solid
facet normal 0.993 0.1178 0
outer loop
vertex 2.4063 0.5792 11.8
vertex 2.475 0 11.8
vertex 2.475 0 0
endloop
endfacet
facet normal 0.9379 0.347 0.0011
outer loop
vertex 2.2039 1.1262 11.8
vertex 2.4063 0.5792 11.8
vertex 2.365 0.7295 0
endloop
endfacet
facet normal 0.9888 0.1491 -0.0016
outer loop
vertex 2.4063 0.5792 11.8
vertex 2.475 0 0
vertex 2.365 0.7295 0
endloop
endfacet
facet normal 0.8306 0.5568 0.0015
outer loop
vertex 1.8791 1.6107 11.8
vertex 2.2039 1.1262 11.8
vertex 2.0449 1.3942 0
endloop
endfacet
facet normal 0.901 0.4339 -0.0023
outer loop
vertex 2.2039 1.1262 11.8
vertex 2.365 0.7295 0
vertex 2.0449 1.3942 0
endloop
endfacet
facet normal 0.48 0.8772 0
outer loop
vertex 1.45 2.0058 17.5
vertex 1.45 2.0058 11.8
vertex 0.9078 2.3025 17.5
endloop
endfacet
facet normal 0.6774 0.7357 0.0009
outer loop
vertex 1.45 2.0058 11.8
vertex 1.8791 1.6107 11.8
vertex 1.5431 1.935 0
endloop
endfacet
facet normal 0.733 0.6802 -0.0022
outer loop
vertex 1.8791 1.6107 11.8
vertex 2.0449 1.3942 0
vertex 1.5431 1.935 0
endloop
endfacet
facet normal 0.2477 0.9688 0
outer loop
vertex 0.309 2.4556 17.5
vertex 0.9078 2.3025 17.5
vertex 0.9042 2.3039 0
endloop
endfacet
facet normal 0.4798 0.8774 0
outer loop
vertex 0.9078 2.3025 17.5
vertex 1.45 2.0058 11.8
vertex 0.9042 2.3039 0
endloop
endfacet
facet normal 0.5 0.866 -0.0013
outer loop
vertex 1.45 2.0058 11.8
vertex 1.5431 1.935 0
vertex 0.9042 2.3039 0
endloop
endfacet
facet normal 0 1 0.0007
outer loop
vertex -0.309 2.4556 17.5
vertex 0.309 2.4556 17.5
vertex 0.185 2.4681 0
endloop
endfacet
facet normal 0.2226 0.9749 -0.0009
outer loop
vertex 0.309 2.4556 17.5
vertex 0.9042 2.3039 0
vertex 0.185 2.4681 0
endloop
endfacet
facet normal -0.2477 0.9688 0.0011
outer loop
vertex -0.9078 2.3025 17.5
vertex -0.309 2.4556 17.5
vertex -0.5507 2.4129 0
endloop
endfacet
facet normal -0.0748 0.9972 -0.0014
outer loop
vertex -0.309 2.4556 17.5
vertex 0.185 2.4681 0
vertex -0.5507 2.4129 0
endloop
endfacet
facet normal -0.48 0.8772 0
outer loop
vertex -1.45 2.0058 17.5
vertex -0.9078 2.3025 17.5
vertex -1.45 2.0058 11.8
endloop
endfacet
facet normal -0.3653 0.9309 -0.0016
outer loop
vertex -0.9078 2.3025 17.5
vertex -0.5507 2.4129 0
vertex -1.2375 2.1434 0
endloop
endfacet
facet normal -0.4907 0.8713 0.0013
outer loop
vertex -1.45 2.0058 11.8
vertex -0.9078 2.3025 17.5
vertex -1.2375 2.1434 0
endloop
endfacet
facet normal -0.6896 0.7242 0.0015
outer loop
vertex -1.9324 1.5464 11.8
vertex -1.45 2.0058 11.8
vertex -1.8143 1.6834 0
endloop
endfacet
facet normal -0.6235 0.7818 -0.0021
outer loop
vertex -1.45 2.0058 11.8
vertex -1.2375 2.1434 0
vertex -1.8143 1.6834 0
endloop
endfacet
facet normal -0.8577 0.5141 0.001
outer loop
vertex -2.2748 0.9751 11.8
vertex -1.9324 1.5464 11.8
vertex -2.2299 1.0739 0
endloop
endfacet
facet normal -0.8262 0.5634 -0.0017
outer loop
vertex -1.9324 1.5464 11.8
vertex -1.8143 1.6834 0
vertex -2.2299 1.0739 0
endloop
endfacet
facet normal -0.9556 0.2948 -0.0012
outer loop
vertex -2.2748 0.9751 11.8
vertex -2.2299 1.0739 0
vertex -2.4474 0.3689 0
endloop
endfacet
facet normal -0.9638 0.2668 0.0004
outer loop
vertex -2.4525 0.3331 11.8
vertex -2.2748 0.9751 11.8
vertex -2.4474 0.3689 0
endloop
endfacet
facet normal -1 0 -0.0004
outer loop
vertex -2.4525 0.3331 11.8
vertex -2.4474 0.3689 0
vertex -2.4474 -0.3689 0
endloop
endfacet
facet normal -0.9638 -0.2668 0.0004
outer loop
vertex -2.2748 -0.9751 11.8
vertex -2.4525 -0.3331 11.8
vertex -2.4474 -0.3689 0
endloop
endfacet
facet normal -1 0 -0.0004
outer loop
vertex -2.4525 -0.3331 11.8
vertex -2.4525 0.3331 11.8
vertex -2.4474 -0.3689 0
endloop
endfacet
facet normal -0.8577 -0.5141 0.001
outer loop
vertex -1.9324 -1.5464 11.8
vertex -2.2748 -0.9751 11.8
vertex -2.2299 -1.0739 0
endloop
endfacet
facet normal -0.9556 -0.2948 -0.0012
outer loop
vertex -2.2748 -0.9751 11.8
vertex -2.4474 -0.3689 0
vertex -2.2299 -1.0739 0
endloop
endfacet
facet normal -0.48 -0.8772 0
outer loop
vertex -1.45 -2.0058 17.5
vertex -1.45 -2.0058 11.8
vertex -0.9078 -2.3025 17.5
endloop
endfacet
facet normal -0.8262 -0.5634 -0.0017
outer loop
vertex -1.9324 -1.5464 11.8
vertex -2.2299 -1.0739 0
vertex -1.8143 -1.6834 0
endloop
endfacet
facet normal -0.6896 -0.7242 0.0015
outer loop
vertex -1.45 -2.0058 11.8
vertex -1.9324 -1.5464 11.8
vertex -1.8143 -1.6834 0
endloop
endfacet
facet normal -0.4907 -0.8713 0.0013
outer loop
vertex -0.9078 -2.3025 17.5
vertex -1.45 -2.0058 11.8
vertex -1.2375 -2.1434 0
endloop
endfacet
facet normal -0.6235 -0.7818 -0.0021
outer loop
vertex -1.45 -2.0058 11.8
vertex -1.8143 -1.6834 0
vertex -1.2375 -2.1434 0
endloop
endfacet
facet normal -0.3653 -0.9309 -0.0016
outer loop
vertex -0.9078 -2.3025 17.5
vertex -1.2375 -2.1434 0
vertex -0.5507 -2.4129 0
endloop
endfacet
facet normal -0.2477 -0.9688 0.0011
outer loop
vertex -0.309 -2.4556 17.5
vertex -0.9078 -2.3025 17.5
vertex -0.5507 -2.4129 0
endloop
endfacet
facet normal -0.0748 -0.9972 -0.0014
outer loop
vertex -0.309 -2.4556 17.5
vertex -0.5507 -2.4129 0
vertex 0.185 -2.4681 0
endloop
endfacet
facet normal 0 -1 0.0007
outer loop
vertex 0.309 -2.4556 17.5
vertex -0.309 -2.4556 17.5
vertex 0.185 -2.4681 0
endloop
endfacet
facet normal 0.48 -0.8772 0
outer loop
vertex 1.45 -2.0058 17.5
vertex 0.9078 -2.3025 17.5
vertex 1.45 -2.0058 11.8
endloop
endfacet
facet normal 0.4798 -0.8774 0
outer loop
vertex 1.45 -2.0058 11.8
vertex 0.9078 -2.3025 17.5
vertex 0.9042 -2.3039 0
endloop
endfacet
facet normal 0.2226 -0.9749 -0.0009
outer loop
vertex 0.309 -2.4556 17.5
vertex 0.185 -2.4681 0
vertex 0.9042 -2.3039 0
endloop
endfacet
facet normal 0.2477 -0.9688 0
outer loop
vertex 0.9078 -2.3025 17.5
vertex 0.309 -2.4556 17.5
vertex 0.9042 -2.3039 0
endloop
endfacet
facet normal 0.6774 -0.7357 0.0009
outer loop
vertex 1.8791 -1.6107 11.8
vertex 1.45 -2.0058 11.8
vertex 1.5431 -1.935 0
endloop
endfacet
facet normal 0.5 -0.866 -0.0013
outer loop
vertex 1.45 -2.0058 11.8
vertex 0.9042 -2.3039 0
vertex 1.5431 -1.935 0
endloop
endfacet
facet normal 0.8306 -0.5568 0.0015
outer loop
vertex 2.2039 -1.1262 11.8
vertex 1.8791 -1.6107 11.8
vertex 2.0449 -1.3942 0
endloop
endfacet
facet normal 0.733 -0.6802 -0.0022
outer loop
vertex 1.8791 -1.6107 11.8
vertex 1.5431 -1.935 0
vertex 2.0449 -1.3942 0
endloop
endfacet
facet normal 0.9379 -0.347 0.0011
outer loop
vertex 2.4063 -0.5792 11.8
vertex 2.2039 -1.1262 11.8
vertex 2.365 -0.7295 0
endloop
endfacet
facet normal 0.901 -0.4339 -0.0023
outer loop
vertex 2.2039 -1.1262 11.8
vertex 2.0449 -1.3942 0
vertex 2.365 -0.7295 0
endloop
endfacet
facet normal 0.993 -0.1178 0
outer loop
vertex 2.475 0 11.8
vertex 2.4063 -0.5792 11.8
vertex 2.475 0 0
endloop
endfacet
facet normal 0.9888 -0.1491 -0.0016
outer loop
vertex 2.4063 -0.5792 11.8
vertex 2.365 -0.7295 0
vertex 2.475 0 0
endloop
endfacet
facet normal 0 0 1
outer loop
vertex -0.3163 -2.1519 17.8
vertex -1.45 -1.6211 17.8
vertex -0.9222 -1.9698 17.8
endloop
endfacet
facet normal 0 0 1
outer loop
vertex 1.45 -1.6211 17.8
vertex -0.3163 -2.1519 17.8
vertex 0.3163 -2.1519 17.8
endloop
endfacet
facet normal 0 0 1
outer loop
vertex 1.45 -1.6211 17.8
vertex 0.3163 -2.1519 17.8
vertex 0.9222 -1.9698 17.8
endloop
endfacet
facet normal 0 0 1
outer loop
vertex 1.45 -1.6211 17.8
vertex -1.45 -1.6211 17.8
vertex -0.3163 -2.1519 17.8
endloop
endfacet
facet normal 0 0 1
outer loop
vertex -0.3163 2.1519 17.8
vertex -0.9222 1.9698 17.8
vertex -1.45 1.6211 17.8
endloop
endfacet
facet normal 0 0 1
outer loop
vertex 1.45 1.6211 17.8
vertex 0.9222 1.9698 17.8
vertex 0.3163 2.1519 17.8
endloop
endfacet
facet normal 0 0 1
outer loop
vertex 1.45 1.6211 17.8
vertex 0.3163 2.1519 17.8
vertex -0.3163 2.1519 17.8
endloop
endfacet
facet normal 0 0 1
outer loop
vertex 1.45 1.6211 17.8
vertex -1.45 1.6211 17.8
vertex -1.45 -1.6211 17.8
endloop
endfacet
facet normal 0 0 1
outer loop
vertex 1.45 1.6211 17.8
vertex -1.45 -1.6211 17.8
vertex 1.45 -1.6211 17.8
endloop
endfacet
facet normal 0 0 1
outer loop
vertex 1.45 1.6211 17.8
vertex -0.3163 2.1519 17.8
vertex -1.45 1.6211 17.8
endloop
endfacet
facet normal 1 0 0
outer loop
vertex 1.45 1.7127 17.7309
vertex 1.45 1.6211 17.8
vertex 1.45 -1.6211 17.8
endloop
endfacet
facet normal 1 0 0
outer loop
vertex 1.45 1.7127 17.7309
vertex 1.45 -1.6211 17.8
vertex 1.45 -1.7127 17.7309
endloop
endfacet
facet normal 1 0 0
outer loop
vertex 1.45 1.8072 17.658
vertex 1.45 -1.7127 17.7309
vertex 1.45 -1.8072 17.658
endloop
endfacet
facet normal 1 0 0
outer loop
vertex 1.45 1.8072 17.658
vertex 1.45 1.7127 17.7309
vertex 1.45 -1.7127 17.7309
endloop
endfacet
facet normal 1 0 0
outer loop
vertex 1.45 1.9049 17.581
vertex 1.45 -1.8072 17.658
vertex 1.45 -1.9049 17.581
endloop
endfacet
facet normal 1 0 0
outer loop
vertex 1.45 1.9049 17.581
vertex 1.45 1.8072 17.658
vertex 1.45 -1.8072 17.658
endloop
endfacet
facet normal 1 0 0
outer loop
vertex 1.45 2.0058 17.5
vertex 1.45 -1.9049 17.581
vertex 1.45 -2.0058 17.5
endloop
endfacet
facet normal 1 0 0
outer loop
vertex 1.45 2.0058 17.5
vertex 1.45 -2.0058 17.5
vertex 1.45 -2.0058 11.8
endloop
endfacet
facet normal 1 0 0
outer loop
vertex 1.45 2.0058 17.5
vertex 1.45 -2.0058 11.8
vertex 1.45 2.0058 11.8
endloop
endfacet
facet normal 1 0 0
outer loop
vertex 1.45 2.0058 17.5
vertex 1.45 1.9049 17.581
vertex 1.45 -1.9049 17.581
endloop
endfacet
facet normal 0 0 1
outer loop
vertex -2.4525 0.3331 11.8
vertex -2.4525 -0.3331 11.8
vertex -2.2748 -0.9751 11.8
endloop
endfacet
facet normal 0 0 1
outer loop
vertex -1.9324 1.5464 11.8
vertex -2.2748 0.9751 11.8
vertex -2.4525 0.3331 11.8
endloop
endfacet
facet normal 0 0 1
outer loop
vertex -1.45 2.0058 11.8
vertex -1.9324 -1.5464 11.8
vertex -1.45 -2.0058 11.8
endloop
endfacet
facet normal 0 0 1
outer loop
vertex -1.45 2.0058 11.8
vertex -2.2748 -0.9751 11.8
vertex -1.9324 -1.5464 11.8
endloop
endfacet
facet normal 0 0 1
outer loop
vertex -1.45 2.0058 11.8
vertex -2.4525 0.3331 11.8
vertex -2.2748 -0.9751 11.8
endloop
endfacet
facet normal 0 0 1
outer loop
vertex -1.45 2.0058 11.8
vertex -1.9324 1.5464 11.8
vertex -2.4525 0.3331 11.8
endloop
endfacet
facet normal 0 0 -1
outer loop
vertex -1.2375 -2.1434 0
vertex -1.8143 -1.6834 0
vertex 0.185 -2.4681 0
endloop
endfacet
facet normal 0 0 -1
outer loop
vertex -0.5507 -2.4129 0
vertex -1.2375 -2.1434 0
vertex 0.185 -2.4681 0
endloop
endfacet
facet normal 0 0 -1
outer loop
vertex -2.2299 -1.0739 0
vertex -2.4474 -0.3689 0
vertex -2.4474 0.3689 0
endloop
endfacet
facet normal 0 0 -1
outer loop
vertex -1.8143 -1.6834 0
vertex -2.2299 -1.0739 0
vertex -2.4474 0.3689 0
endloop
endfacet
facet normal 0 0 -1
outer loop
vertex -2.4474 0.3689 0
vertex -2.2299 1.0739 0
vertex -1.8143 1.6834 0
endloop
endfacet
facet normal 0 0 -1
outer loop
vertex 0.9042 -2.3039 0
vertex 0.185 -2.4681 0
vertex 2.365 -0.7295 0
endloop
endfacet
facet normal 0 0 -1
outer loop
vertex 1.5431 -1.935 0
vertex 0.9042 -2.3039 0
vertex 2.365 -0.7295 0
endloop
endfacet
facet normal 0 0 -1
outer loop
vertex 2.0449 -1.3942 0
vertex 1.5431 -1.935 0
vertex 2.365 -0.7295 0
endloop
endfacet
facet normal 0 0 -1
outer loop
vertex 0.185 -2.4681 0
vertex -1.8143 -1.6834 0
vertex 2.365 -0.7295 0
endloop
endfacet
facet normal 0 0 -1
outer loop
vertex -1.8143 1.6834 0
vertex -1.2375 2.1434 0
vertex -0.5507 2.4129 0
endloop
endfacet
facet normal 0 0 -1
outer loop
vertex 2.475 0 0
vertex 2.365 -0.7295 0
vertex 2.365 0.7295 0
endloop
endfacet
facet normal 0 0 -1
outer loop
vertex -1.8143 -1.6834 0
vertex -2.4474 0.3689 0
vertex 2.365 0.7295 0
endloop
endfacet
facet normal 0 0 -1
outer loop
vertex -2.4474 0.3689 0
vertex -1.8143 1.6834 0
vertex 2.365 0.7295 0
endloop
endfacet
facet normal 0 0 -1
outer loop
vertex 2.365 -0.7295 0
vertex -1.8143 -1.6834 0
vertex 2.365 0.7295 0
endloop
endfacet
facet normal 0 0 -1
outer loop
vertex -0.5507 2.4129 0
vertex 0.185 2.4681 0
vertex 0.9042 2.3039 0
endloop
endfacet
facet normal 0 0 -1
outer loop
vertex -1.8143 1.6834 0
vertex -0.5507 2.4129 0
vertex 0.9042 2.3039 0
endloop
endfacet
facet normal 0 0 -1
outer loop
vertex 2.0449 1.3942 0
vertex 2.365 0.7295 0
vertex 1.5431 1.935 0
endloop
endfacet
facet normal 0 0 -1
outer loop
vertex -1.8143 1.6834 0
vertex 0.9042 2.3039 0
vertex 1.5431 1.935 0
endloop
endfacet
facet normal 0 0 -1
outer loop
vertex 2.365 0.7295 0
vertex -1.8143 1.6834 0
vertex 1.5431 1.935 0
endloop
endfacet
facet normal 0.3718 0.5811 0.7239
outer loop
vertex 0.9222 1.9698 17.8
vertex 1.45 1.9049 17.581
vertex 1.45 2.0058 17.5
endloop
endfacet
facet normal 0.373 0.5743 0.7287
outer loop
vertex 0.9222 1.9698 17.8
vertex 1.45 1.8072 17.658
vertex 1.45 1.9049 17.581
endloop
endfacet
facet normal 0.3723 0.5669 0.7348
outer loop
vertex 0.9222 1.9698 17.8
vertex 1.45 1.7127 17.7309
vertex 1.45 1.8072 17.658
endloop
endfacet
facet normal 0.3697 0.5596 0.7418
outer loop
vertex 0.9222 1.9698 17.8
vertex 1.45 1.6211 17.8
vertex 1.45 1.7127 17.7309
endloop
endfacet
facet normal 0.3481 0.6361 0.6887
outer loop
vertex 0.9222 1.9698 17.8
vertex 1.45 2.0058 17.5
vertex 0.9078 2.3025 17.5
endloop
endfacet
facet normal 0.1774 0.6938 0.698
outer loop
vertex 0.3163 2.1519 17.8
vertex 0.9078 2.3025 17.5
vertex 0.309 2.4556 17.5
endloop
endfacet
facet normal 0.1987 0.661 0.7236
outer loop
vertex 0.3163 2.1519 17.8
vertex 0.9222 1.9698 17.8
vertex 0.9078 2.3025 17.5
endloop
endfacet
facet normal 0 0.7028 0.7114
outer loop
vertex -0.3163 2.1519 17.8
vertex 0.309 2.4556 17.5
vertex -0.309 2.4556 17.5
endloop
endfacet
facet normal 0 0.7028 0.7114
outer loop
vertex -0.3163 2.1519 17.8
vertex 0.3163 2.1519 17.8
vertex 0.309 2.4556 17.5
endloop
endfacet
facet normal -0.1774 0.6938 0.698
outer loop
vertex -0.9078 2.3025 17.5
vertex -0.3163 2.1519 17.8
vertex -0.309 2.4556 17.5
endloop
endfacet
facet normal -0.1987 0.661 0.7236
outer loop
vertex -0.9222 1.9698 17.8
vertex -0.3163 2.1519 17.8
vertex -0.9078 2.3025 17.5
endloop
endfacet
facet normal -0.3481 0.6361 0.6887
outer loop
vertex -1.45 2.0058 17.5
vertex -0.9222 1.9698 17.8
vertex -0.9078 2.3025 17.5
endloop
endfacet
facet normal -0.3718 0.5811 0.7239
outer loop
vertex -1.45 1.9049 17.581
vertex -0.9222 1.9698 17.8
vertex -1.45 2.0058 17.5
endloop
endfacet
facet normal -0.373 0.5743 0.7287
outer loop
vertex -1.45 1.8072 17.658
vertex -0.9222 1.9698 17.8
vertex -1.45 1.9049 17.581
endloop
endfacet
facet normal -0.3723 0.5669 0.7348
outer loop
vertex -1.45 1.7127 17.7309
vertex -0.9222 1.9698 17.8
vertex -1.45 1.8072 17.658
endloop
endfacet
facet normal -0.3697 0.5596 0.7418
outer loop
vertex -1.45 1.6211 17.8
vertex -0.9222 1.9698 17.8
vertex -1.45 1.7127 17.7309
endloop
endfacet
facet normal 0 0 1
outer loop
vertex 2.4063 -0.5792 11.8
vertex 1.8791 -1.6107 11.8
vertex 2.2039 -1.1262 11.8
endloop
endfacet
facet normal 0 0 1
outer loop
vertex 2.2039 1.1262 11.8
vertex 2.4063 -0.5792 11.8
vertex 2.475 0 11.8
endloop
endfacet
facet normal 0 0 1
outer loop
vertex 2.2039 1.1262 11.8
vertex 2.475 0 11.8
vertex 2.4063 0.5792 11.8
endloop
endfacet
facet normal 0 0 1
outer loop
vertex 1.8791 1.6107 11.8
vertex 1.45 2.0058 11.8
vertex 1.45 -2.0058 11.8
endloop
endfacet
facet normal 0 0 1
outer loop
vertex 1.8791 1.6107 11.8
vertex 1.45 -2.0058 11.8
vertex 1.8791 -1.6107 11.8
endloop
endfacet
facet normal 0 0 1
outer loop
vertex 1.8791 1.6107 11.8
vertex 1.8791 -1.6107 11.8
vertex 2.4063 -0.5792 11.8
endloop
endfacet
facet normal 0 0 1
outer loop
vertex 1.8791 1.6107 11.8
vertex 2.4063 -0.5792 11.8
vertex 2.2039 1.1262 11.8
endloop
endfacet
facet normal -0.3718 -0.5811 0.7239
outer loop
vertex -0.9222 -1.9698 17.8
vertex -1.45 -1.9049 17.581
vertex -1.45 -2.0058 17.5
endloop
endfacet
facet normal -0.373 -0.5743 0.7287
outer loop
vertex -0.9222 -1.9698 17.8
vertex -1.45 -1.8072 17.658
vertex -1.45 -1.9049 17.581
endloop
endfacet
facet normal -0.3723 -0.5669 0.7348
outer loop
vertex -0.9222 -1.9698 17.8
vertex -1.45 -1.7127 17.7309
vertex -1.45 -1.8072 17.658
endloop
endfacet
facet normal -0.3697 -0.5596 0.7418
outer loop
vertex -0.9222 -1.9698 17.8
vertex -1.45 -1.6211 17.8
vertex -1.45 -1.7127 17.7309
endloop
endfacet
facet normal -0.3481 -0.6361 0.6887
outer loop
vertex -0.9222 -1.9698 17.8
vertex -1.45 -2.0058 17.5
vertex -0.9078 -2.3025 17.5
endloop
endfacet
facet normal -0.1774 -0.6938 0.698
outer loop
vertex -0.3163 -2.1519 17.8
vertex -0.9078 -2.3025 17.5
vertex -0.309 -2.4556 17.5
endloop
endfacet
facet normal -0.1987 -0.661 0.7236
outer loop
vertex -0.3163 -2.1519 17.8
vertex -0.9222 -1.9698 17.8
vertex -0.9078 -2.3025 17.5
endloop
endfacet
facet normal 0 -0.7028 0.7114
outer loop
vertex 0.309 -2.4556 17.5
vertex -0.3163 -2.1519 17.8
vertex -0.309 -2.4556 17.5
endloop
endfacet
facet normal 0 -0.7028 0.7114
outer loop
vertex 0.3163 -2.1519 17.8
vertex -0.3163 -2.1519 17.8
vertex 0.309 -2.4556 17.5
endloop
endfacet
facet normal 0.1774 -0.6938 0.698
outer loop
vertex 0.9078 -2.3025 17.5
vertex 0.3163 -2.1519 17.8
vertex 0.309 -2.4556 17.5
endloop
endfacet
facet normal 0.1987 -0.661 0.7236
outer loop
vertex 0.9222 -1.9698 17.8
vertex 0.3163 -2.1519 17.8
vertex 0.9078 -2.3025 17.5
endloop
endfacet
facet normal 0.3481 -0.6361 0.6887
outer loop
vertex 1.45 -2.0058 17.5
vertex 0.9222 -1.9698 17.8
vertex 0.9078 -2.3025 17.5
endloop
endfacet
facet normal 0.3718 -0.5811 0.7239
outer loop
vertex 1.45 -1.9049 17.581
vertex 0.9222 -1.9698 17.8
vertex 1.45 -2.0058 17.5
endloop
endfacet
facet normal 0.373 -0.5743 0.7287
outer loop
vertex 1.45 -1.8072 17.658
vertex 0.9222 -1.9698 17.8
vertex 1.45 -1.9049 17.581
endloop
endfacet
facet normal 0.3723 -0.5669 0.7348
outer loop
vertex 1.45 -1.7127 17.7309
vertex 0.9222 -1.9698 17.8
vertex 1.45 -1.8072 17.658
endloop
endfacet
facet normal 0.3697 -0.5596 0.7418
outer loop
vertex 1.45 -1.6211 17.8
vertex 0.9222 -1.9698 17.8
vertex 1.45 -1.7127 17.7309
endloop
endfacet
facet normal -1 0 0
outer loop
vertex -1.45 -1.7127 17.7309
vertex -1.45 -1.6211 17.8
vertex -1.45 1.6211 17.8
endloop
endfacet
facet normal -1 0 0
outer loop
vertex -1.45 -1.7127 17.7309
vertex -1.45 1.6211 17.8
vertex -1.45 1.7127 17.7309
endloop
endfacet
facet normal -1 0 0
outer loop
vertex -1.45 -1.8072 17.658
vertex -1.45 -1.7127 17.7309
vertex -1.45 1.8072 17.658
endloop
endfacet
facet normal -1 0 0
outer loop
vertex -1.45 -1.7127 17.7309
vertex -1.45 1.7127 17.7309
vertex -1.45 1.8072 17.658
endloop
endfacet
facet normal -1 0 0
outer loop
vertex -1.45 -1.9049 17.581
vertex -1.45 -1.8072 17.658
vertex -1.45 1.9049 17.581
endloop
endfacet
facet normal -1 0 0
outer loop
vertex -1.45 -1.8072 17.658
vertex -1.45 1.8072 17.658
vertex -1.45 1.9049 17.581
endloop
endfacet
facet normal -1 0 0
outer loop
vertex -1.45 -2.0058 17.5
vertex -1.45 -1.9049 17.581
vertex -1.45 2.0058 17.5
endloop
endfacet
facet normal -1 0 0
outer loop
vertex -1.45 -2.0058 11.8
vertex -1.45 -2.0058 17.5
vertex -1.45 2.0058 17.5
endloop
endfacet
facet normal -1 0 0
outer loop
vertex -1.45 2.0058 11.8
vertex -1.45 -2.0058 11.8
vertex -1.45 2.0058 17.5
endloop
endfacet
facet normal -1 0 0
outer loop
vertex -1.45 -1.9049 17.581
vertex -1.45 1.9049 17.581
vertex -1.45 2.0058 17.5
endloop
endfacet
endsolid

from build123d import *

# Parameters (mm, degrees)
SKETCH1_R           = 2.475
EXTRUDE1_DEPTH      = 17.8
SKETCH2_OUTSIDE_W   = 10.776
SKETCH2_OUTSIDE_H   = 10.776
SKETCH2_OUTSIDE_W_2 = 2.9
SKETCH2_OUTSIDE_H_2 = 7
EXTRUDE2_DEPTH      = 6
CHAMFER1_SIZE       = 0.3


with BuildPart() as part:
    # Sketch1 → Extrude1 (new body)
    with BuildSketch(Plane.XY):
        Circle(SKETCH1_R)
    extrude(amount=EXTRUDE1_DEPTH)

    # Sketch2 outside → Extrude2 (cut)
    with BuildSketch(Plane.XY.offset(17.8)):
        Rectangle(SKETCH2_OUTSIDE_W, SKETCH2_OUTSIDE_H)
        Rectangle(SKETCH2_OUTSIDE_W_2, SKETCH2_OUTSIDE_H_2, mode=Mode.SUBTRACT)
    extrude(amount=-EXTRUDE2_DEPTH, mode=Mode.SUBTRACT)

    # Chamfer1
    chamfer1_edges = [part.edges().sort_by_distance(p)[0] for p in [
        (0, 2.475, 17.8),
        (0, -2.475, 17.8),
    ]]
    chamfer(chamfer1_edges, length=CHAMFER1_SIZE)


solid = part.part
